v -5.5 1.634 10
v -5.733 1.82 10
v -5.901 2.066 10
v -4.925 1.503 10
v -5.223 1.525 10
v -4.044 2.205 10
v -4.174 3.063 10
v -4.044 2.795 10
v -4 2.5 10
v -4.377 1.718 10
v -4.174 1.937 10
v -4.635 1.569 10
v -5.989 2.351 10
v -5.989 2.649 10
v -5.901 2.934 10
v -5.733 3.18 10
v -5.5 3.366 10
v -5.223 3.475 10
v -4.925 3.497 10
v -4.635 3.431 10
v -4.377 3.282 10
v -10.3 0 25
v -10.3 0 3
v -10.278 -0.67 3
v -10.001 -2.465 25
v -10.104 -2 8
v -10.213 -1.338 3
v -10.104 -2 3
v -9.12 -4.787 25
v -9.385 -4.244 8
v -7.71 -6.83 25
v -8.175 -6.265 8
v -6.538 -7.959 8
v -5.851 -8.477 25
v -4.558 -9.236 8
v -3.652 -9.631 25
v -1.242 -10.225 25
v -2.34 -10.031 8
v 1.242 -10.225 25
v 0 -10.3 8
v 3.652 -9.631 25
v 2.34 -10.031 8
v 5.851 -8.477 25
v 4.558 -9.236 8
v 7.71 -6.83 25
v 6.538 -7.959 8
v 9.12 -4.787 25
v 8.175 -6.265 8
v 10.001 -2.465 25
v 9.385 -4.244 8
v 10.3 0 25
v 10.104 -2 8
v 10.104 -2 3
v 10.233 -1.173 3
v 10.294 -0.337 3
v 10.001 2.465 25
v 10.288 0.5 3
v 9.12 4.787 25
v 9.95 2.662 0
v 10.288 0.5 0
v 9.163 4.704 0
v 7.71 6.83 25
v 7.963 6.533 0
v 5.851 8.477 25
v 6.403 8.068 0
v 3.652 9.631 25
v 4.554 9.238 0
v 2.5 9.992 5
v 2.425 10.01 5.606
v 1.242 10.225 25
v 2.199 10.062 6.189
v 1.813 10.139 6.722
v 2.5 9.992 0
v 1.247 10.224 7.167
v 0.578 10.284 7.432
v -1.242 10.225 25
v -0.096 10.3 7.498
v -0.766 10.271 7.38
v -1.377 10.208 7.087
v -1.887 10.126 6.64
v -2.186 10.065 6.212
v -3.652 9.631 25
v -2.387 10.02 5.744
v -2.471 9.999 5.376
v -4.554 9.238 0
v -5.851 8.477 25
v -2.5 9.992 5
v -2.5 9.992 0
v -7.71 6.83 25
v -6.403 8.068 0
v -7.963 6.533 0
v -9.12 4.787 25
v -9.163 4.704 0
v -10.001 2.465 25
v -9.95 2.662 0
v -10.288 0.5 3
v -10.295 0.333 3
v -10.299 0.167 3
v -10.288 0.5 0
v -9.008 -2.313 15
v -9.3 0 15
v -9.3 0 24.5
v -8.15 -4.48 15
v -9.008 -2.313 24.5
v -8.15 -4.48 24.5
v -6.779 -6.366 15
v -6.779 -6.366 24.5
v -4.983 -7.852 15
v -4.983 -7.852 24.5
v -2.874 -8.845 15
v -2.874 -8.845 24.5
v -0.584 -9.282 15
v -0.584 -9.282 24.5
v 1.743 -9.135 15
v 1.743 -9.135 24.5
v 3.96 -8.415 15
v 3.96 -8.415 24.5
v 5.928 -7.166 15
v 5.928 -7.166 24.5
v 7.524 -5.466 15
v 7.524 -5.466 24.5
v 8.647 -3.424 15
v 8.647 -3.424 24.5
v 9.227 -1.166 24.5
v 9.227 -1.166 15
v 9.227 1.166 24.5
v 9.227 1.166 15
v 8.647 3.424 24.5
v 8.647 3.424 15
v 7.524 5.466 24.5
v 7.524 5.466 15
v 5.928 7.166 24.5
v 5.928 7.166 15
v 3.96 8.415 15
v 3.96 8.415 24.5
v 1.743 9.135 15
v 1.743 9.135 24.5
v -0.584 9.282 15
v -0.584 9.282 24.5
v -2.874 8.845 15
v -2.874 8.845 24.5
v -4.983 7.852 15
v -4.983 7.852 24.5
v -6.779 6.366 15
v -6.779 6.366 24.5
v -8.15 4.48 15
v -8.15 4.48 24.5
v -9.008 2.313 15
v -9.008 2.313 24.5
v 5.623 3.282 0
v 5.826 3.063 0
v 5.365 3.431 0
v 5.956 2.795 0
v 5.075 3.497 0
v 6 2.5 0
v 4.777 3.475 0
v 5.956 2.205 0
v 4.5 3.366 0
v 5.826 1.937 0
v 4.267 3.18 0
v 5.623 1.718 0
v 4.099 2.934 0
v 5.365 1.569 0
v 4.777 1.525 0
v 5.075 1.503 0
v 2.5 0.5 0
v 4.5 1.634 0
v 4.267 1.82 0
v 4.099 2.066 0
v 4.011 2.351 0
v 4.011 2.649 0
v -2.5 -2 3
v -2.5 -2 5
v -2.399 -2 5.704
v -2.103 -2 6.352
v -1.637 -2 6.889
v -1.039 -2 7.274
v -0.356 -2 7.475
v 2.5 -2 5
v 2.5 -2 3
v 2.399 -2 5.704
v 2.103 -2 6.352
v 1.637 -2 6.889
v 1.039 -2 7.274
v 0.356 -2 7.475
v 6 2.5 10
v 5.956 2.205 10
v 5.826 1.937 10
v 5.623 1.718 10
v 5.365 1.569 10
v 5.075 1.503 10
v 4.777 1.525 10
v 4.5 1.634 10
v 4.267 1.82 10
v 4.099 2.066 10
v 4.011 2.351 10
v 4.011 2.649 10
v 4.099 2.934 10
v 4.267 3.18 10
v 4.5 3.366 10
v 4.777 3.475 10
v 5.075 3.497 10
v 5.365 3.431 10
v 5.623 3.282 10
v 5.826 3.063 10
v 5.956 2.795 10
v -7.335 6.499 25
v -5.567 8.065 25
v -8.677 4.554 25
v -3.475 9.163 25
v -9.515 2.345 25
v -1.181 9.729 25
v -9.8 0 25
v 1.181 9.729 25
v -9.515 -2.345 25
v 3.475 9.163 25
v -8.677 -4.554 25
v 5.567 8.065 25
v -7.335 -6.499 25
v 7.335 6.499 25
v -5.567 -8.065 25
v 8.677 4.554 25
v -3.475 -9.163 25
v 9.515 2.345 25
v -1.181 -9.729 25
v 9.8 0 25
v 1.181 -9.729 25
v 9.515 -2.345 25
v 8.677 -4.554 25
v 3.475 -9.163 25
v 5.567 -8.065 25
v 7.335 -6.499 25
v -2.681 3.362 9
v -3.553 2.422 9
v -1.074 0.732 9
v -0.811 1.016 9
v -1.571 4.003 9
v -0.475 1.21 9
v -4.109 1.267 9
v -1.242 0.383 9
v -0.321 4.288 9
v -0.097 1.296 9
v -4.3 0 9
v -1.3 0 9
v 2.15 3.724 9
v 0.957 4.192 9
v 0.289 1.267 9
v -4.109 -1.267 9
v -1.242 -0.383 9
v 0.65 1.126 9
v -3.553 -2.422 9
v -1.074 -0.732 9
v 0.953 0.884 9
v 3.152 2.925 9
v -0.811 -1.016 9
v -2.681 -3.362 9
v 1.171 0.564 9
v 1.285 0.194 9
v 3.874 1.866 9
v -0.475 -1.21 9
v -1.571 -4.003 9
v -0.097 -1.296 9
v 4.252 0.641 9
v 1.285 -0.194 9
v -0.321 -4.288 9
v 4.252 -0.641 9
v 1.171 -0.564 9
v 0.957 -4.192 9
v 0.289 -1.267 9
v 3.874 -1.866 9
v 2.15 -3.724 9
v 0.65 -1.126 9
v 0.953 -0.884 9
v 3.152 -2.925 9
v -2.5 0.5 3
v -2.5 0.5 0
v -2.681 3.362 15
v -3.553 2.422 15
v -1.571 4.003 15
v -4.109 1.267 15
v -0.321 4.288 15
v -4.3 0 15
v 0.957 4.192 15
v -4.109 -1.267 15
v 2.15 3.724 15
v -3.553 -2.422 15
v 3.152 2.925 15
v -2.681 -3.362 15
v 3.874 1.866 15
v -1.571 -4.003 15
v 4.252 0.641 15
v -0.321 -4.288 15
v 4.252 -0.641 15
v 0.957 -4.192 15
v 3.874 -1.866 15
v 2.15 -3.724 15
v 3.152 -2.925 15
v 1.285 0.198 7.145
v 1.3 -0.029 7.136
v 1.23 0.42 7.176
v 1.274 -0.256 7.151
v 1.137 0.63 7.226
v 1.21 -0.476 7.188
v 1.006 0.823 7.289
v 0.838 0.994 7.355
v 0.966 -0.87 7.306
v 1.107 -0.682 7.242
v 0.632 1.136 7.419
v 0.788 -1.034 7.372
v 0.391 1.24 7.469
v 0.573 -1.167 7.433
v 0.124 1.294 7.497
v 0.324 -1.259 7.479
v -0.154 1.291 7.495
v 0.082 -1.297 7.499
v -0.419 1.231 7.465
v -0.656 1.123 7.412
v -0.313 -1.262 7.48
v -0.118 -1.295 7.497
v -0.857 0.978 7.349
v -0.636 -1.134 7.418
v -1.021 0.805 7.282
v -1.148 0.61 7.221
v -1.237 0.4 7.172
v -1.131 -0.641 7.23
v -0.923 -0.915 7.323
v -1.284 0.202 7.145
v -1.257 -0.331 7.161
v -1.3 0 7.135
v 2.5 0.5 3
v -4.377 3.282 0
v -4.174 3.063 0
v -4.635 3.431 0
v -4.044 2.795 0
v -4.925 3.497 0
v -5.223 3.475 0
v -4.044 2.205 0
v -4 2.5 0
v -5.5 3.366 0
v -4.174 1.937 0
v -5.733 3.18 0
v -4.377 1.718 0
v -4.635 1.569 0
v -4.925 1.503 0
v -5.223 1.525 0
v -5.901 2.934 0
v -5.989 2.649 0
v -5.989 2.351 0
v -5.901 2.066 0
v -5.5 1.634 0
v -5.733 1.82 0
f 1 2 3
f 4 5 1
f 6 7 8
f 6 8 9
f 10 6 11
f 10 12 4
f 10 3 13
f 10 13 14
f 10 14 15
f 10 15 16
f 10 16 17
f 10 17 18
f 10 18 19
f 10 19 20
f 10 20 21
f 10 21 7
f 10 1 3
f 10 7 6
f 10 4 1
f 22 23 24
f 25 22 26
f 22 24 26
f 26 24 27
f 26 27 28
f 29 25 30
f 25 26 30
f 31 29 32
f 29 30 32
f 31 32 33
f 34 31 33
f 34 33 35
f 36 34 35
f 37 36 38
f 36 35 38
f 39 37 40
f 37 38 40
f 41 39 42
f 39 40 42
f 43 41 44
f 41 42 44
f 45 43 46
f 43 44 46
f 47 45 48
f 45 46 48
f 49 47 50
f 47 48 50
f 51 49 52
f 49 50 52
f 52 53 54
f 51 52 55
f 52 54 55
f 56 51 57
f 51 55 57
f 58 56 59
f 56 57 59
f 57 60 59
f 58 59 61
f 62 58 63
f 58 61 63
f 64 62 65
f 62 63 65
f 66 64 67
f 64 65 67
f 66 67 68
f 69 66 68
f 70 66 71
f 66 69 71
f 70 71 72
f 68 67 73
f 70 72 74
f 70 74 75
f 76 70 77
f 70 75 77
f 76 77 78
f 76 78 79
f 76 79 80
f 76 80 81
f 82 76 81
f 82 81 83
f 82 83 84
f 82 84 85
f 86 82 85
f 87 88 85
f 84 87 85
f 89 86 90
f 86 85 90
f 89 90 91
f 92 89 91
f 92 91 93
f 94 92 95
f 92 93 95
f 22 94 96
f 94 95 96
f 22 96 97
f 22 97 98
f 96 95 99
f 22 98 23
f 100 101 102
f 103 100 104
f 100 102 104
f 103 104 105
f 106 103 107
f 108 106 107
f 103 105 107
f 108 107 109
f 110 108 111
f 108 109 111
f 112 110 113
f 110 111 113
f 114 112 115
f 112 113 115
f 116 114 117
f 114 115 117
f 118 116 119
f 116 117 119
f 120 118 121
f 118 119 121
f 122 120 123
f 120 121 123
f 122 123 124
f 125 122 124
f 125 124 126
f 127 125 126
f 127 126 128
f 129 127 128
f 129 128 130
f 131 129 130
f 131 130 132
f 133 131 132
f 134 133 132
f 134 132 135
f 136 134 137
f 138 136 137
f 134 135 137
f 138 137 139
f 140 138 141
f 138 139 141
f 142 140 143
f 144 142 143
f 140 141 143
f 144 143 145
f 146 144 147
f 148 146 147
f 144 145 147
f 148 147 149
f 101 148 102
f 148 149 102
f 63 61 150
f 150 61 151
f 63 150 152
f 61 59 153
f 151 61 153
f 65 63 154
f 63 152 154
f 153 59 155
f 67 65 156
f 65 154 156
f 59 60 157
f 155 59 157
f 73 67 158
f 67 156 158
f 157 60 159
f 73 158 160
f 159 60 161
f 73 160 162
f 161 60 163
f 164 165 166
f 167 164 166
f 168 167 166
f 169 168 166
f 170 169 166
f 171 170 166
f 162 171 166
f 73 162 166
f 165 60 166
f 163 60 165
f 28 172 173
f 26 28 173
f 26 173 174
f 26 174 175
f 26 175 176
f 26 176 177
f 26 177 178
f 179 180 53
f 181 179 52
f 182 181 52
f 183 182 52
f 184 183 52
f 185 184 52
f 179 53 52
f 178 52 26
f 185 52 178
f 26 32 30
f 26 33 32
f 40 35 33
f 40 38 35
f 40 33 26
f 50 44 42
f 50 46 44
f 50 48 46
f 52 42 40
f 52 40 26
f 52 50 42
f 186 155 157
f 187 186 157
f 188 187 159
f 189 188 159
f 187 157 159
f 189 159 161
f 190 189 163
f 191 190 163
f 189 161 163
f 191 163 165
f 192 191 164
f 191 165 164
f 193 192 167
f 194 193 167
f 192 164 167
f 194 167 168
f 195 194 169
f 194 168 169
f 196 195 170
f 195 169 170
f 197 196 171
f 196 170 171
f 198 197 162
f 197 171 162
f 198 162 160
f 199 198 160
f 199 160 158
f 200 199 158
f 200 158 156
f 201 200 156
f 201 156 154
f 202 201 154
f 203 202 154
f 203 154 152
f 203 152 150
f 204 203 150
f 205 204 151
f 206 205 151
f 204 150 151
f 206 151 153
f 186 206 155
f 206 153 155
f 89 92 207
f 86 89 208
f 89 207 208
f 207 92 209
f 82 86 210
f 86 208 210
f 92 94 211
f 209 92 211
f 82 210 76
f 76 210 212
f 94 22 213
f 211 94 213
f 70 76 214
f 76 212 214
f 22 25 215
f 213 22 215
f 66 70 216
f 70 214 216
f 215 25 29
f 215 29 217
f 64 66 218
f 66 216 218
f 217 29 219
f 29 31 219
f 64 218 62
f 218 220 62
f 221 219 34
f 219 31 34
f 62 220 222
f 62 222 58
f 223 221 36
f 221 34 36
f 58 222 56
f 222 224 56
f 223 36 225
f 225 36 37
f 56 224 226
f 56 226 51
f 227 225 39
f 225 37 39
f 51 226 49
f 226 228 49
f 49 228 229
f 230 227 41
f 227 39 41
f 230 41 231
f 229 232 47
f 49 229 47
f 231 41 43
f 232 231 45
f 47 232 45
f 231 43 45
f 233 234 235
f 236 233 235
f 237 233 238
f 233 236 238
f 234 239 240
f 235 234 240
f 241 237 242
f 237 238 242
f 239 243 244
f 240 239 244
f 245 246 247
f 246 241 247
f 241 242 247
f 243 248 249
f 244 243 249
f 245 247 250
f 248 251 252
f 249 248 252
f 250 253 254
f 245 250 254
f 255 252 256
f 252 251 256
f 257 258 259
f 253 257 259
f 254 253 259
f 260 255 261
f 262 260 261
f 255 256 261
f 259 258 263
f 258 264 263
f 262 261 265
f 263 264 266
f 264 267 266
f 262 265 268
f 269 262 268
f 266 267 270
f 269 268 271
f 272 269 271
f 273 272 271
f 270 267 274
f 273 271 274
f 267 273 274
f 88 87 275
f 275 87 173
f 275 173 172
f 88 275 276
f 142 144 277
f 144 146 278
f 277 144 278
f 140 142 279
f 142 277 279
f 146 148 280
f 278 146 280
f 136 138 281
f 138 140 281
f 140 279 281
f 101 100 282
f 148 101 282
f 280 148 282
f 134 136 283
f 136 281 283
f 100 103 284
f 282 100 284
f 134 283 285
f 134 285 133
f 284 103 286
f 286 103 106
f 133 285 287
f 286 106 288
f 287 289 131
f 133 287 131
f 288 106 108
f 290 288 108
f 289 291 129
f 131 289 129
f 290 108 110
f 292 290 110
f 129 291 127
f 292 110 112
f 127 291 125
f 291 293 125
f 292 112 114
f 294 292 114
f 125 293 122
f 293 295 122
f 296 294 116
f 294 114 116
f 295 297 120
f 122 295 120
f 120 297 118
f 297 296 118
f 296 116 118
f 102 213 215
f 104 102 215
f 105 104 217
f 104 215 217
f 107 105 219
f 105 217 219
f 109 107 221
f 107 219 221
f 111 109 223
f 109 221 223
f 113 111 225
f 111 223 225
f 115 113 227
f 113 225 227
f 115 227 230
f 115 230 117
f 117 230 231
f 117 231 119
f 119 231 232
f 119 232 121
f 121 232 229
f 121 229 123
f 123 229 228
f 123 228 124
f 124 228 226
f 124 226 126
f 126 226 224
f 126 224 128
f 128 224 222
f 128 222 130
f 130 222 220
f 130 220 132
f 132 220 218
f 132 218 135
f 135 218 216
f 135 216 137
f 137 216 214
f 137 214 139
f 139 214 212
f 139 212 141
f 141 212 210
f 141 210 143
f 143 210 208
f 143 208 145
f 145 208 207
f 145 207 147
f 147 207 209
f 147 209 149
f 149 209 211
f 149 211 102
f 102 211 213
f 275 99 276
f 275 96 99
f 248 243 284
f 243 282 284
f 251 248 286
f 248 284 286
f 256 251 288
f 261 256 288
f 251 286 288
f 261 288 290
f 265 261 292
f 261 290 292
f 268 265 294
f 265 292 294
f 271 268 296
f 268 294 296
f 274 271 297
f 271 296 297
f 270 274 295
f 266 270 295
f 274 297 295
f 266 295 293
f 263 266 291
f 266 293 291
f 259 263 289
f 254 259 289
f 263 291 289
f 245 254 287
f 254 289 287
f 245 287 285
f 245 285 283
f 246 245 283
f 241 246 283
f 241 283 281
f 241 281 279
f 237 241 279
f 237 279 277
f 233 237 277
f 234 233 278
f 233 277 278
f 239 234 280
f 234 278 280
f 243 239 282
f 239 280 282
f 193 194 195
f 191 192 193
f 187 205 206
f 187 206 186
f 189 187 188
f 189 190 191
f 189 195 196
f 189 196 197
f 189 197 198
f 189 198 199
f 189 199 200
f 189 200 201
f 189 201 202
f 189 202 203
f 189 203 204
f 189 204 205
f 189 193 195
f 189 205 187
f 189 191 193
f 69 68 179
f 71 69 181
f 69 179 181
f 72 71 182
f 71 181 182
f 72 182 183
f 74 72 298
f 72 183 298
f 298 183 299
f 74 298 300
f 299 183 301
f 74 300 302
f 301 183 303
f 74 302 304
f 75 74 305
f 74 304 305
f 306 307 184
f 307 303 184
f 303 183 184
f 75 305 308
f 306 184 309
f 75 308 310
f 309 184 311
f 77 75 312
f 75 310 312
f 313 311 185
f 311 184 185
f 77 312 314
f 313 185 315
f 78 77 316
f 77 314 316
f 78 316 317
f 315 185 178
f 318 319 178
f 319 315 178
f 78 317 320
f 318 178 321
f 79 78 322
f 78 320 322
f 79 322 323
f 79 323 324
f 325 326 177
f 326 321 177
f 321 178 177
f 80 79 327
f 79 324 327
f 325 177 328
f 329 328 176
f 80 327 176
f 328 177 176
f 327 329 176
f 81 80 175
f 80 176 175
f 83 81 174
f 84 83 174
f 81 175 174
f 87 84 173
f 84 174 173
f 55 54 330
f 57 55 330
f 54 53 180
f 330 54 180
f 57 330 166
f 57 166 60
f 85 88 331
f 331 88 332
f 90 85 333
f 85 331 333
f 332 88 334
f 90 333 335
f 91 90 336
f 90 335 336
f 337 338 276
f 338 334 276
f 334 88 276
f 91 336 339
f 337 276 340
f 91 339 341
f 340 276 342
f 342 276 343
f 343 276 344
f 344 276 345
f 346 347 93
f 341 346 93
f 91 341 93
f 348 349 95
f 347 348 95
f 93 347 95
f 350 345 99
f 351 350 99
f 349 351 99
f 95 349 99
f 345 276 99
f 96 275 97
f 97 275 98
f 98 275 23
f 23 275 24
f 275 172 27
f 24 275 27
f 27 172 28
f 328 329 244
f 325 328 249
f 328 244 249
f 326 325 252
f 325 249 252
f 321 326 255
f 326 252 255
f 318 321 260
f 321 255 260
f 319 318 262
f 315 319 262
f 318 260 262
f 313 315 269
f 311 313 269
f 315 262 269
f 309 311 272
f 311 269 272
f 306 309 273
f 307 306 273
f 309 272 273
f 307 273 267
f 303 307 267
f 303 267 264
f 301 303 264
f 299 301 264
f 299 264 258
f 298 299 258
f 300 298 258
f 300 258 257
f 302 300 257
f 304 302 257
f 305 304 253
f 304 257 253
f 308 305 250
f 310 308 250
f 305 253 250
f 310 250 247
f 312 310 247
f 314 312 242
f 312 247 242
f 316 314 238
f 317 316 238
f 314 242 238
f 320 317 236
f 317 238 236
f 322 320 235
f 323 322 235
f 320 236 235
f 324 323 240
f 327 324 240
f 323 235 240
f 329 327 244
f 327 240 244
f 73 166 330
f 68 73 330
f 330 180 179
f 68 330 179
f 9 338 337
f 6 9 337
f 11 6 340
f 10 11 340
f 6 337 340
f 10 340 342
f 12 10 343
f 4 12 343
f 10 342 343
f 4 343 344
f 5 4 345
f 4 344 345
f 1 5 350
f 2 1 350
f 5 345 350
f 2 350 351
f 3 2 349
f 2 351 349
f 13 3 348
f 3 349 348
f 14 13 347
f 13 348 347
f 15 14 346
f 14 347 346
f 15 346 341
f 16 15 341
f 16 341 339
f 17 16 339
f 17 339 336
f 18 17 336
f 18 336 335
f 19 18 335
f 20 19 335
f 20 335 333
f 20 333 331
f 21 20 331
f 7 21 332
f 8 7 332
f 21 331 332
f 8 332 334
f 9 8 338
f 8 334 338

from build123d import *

# Parameters (mm, degrees)
F3_DEPTH  = 18
F4_W      = 8.3
F4_H      = 8
F5_DEPTH  = 10.3
F6_W      = 7.6039596199
F6_H      = 3
F6_W_2    = 0.1960403801
F7_DEPTH  = 2.5
F8_SIZE   = 0.5
F9_R      = 1
F10_DEPTH = 10


# Not quite as in the source:
# - a feature names something its author has since deleted; it is built from what else it names


with BuildPart() as f1:
    # F0 (on Front) → F1 (revolve)
    with BuildSketch(Plane.XZ):
        Polygon((-10.3, 0), (-1.3, 0), (-1.3, 9), (-4.3, 9), (-4.3, 15), (-9.3, 15), (-9.3, 25), (-10.3, 25), align=None)
    revolve(axis=Axis((0, 0, 8.3402672317), (0, 0, 1)))

    # F2 (on Front) → F3 (cut, symmetric)
    with BuildSketch(Plane.XZ):
        with BuildLine():
            Line((-2.5, 5), (-2.5, 0))
            Line((-2.5, 0), (0, 0))
            Line((0, 0), (2.5, 0))
            Line((2.5, 0), (2.5, 5))
            ThreePointArc((2.5, 5), (0, 2.5), (-2.5, 5))
        make_face()
        with BuildLine():
            ThreePointArc((2.5, 5), (0, 7.5), (-2.5, 5))
            ThreePointArc((-2.5, 5), (0, 2.5), (2.5, 5))
        make_face()
    extrude(amount=F3_DEPTH, both=True, mode=Mode.SUBTRACT)

    # F4 (on Right) → F5 (cut, symmetric)
    with BuildSketch(Plane.YZ):
        with Locations((-6.15, 4)):
            Rectangle(F4_W, F4_H)
    extrude(amount=F5_DEPTH, both=True, mode=Mode.SUBTRACT)

    # F6 (on face) → F7 (cut)
    with BuildSketch(Plane.XZ.offset(2)):
        with Locations((6.3019798099, 1.5)):
            Rectangle(F6_W, F6_H)
        with Locations((-6.3019798099, 1.5)):
            Rectangle(F6_W, F6_H)
        with Locations((10.2019798099, 1.5)):
            Rectangle(F6_W_2, F6_H)
        with Locations((-10.2019798099, 1.5)):
            Rectangle(F6_W_2, F6_H)
    extrude(amount=-F7_DEPTH, mode=Mode.SUBTRACT)

    # F8
    f8_edges = [f1.edges().sort_by_distance(p)[0] for p in [
        (9.3, 0, 25),
    ]]
    chamfer(f8_edges, length=F8_SIZE)

    # F9 (on face) → F10 (cut)
    with BuildSketch(Plane(origin=(0, 0, 0), x_dir=(1, 0, 0), z_dir=(0, 0, -1))):
        with Locations((-5, -2.5)):
            Circle(F9_R)
        with Locations((5, -2.5)):
            Circle(F9_R)
    extrude(amount=-F10_DEPTH, mode=Mode.SUBTRACT)


solid = f1.part
